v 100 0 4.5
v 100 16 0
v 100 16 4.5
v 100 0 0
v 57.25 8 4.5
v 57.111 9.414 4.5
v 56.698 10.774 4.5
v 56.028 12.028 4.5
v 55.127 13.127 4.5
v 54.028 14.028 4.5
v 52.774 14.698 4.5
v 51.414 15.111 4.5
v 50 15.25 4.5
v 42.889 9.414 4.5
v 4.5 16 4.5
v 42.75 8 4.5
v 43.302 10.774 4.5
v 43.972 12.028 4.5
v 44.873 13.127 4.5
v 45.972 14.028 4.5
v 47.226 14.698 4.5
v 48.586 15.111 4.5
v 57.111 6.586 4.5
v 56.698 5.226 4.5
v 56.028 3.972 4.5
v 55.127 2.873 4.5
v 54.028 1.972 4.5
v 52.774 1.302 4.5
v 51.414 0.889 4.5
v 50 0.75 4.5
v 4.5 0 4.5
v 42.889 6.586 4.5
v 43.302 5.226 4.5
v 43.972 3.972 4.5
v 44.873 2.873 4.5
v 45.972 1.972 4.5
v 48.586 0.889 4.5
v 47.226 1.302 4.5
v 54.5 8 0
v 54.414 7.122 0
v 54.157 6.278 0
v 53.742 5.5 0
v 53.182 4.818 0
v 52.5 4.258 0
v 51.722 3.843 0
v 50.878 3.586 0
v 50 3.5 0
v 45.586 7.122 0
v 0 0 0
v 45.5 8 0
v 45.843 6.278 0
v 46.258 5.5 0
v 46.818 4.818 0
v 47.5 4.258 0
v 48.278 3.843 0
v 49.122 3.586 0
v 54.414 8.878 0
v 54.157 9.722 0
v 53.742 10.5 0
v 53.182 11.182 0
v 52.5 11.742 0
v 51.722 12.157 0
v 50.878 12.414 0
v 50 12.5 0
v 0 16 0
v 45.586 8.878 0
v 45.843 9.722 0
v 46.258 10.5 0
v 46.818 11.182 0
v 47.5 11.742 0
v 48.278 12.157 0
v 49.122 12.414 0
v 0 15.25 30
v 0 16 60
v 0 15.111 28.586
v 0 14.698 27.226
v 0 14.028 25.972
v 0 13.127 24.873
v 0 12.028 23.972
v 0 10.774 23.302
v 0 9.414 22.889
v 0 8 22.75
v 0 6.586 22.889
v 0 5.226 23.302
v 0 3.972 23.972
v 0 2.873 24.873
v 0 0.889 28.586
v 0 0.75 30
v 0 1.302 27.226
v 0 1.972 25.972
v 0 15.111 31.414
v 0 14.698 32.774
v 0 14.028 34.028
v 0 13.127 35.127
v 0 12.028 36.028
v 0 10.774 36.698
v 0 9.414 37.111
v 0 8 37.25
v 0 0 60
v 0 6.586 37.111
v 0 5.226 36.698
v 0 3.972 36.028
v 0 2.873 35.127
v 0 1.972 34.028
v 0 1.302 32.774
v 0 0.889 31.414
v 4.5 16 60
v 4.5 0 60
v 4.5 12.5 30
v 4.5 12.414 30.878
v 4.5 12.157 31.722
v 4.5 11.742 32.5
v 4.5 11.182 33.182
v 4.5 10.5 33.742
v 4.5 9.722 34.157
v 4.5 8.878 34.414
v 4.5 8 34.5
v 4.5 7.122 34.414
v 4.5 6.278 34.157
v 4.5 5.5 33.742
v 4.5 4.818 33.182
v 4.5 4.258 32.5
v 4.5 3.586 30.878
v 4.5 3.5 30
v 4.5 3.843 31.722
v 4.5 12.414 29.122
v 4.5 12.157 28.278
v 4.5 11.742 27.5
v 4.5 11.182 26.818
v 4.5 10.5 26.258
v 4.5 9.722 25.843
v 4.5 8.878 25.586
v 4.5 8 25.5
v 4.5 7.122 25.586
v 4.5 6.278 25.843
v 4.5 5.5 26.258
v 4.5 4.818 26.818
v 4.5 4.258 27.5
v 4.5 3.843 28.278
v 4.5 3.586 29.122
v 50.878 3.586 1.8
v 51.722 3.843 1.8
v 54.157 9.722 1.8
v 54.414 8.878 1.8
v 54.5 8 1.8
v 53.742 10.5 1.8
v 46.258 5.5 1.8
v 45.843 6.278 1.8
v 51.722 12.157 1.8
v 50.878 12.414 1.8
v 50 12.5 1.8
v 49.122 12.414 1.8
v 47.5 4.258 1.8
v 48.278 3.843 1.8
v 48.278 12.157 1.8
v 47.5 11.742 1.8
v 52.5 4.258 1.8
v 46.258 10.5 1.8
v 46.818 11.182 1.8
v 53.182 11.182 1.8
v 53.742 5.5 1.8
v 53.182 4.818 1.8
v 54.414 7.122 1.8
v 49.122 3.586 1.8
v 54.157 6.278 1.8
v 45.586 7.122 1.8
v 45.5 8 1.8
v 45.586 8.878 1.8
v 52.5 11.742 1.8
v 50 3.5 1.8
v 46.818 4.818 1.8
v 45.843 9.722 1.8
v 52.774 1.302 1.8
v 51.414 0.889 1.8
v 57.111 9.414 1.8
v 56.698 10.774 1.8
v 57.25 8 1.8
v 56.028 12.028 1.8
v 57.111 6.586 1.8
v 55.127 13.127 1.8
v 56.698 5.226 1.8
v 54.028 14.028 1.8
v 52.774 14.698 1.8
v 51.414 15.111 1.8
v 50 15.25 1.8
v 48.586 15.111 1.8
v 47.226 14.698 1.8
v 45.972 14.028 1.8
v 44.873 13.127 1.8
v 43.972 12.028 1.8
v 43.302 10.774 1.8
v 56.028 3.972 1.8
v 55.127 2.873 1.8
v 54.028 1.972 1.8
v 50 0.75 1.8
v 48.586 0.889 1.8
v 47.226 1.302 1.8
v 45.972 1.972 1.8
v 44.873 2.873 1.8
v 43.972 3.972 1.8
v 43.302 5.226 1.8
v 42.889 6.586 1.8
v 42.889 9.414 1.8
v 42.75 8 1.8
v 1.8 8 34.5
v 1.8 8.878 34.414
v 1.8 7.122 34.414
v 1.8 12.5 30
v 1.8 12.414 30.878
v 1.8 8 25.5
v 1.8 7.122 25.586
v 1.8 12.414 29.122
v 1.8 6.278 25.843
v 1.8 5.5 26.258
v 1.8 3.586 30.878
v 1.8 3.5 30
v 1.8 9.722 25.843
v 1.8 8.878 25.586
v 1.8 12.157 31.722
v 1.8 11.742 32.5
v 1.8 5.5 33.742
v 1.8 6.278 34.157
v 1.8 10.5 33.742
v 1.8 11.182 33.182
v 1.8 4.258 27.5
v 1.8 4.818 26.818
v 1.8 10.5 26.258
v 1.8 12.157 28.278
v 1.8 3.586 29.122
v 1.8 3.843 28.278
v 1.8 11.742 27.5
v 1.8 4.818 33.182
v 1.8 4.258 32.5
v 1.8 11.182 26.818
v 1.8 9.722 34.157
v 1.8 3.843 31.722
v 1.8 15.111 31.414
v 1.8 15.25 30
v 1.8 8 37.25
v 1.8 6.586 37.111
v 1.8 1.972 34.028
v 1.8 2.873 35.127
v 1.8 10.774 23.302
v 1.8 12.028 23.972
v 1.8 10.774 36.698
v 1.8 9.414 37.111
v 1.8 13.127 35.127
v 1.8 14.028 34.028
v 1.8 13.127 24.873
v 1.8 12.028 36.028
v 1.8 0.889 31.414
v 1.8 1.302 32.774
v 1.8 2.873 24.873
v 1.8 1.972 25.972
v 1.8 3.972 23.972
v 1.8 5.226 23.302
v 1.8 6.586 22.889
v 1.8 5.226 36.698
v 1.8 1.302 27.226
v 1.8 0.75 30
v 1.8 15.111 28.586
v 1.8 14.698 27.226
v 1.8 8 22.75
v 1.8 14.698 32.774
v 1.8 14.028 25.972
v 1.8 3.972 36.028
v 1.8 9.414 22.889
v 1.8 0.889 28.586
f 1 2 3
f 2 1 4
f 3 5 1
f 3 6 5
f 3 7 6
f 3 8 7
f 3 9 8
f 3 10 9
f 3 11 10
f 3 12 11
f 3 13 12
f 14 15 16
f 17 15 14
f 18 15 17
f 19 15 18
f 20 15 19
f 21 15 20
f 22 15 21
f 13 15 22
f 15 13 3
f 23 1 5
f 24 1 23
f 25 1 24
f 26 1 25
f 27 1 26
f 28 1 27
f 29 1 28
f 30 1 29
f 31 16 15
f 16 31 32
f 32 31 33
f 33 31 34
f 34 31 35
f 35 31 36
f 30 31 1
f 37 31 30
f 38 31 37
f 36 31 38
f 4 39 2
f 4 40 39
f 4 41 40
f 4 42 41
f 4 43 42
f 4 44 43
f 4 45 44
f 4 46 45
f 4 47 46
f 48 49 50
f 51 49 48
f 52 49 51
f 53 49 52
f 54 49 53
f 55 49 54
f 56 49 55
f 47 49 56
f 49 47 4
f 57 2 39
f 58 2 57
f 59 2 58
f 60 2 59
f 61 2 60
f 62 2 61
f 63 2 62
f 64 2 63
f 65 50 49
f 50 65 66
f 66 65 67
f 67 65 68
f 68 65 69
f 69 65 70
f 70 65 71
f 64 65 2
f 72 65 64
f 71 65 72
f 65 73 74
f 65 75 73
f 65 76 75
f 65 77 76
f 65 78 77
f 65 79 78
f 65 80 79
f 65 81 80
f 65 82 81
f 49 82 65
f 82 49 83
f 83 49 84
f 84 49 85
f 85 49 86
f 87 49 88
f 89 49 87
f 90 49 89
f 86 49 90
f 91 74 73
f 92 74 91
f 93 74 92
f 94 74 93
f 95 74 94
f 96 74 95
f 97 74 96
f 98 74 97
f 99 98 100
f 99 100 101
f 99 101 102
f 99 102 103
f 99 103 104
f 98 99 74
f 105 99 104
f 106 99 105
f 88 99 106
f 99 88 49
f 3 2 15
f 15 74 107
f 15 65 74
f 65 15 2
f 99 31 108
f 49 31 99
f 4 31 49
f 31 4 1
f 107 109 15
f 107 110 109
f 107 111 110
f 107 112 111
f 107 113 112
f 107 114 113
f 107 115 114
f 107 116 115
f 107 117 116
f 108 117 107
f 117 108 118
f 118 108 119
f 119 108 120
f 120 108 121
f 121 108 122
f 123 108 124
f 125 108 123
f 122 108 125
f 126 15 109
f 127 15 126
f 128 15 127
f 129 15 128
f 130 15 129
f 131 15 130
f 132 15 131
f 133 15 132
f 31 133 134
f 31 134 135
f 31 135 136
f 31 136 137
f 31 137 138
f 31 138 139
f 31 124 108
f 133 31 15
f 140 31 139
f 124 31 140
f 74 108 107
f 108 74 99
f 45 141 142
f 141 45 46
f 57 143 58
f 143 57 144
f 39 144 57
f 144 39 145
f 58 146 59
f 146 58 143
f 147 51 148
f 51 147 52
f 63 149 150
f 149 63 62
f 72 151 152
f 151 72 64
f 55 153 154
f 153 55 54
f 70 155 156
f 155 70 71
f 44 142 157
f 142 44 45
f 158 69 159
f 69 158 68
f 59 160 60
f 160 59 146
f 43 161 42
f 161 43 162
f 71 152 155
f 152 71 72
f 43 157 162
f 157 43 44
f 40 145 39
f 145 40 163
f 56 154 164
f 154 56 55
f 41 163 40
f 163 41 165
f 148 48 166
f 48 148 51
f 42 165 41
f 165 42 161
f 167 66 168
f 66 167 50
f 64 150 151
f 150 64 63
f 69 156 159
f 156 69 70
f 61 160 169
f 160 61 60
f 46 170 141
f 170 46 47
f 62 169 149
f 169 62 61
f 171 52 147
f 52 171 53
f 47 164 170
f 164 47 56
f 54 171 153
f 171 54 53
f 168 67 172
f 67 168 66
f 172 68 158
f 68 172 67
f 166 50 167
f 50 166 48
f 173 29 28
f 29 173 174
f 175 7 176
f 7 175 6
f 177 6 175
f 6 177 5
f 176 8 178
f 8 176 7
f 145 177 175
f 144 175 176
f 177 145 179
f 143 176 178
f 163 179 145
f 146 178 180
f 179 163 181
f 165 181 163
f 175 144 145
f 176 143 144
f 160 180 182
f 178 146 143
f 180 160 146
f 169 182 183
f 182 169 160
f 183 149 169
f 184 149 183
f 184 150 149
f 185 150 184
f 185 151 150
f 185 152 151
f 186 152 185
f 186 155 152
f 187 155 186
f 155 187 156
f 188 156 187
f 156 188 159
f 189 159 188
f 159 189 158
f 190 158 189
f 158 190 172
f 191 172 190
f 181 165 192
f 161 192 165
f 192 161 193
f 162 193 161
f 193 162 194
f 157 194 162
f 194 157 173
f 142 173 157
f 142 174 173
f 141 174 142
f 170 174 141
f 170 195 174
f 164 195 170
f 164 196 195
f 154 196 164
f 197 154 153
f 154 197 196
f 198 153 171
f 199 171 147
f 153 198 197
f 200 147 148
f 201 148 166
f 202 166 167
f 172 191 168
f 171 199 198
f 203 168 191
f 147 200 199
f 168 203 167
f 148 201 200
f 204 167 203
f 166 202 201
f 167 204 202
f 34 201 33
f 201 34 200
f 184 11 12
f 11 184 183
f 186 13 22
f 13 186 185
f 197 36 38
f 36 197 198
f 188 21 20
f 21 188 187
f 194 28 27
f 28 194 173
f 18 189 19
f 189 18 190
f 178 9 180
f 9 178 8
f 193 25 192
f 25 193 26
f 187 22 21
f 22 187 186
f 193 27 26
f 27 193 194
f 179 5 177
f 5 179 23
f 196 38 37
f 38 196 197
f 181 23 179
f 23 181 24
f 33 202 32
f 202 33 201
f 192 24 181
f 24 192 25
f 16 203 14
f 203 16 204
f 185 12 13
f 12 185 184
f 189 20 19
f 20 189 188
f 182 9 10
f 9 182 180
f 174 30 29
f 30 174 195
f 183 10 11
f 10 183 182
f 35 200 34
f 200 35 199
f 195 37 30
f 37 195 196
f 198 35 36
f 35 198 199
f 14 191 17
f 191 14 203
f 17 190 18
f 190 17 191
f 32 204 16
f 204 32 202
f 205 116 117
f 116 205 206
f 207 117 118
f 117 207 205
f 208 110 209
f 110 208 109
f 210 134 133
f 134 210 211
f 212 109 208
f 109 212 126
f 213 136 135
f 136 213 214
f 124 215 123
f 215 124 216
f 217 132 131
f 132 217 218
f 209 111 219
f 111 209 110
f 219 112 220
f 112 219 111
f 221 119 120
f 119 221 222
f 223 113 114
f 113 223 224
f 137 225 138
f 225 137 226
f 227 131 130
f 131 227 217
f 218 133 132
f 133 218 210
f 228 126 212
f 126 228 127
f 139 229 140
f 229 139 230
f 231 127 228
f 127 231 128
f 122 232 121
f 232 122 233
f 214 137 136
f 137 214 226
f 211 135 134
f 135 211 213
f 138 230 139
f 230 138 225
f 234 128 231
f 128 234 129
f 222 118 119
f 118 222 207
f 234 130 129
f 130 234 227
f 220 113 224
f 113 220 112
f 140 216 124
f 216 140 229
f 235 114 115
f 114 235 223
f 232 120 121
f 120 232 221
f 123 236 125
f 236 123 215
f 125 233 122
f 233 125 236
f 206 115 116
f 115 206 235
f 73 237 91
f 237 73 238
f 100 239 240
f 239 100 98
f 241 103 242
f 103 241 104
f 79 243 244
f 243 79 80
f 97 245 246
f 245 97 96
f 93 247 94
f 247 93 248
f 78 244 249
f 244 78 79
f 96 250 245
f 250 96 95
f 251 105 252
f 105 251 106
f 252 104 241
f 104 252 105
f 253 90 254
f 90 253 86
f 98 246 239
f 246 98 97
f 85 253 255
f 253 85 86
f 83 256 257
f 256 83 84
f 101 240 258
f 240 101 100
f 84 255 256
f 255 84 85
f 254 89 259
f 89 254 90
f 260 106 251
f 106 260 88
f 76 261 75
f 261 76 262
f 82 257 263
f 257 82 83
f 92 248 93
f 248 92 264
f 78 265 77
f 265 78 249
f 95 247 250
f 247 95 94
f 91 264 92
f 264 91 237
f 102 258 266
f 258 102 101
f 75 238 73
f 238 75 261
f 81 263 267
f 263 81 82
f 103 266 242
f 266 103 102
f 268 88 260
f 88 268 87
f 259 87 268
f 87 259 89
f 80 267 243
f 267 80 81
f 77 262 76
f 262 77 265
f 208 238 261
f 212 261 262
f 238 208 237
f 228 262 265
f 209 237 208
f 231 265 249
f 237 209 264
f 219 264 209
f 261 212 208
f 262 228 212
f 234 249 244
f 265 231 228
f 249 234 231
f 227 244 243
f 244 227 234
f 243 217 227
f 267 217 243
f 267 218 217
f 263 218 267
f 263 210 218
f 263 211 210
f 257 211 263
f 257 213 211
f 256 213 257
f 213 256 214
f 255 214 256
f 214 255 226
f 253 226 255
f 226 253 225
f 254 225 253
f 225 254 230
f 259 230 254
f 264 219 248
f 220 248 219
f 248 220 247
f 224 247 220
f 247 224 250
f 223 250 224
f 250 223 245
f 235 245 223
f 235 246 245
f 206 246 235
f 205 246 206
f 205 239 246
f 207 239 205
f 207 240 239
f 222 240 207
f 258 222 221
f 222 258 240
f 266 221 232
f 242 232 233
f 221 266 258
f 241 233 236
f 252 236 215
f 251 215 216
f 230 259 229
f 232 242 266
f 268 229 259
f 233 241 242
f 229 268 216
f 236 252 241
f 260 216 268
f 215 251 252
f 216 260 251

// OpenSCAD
$fn = 32;

// ----------------------------------------------------------------------
// L-bracket: 100 x 16 x 60 mm
// ----------------------------------------------------------------------

// --- parameters (mm) ---
arm_x = 100;              // horizontal leg, X
arm_z = 60;               // vertical leg, Z
width = 16;               // bracket depth, Y
wall = 4.5;               // plate thickness
hole_d = 9;               // clearance for M8
cb_d = 14.5;              // counterbore seat
cb_h = 2.7;               // counterbore depth

module hole_z(px, py) {
  translate([px, py, -0.5]) cylinder(h = wall + 1, d = hole_d);
}
module hole_x(pz, py) {
  translate([-0.5, py, pz]) rotate([0, 90, 0]) cylinder(h = wall + 1, d = hole_d);
}
module cb_z(px, py) {
  translate([px, py, wall - cb_h]) cylinder(h = cb_h + 0.4, d = cb_d);
}
module cb_x(pz, py) {
  translate([wall - cb_h, py, pz]) rotate([0, -90, 0]) cylinder(h = cb_h + 0.4, d = cb_d);
}

difference() {
  union() {
    /* horizontal leg */
    cube([arm_x, width, wall]);
    /* vertical leg, overlapping the corner block */
    cube([wall, width, arm_z]);
  }
  hole_z(50, 8);
  cb_z(50, 8);
  hole_x(30, 8);
  cb_x(30, 8);
}
